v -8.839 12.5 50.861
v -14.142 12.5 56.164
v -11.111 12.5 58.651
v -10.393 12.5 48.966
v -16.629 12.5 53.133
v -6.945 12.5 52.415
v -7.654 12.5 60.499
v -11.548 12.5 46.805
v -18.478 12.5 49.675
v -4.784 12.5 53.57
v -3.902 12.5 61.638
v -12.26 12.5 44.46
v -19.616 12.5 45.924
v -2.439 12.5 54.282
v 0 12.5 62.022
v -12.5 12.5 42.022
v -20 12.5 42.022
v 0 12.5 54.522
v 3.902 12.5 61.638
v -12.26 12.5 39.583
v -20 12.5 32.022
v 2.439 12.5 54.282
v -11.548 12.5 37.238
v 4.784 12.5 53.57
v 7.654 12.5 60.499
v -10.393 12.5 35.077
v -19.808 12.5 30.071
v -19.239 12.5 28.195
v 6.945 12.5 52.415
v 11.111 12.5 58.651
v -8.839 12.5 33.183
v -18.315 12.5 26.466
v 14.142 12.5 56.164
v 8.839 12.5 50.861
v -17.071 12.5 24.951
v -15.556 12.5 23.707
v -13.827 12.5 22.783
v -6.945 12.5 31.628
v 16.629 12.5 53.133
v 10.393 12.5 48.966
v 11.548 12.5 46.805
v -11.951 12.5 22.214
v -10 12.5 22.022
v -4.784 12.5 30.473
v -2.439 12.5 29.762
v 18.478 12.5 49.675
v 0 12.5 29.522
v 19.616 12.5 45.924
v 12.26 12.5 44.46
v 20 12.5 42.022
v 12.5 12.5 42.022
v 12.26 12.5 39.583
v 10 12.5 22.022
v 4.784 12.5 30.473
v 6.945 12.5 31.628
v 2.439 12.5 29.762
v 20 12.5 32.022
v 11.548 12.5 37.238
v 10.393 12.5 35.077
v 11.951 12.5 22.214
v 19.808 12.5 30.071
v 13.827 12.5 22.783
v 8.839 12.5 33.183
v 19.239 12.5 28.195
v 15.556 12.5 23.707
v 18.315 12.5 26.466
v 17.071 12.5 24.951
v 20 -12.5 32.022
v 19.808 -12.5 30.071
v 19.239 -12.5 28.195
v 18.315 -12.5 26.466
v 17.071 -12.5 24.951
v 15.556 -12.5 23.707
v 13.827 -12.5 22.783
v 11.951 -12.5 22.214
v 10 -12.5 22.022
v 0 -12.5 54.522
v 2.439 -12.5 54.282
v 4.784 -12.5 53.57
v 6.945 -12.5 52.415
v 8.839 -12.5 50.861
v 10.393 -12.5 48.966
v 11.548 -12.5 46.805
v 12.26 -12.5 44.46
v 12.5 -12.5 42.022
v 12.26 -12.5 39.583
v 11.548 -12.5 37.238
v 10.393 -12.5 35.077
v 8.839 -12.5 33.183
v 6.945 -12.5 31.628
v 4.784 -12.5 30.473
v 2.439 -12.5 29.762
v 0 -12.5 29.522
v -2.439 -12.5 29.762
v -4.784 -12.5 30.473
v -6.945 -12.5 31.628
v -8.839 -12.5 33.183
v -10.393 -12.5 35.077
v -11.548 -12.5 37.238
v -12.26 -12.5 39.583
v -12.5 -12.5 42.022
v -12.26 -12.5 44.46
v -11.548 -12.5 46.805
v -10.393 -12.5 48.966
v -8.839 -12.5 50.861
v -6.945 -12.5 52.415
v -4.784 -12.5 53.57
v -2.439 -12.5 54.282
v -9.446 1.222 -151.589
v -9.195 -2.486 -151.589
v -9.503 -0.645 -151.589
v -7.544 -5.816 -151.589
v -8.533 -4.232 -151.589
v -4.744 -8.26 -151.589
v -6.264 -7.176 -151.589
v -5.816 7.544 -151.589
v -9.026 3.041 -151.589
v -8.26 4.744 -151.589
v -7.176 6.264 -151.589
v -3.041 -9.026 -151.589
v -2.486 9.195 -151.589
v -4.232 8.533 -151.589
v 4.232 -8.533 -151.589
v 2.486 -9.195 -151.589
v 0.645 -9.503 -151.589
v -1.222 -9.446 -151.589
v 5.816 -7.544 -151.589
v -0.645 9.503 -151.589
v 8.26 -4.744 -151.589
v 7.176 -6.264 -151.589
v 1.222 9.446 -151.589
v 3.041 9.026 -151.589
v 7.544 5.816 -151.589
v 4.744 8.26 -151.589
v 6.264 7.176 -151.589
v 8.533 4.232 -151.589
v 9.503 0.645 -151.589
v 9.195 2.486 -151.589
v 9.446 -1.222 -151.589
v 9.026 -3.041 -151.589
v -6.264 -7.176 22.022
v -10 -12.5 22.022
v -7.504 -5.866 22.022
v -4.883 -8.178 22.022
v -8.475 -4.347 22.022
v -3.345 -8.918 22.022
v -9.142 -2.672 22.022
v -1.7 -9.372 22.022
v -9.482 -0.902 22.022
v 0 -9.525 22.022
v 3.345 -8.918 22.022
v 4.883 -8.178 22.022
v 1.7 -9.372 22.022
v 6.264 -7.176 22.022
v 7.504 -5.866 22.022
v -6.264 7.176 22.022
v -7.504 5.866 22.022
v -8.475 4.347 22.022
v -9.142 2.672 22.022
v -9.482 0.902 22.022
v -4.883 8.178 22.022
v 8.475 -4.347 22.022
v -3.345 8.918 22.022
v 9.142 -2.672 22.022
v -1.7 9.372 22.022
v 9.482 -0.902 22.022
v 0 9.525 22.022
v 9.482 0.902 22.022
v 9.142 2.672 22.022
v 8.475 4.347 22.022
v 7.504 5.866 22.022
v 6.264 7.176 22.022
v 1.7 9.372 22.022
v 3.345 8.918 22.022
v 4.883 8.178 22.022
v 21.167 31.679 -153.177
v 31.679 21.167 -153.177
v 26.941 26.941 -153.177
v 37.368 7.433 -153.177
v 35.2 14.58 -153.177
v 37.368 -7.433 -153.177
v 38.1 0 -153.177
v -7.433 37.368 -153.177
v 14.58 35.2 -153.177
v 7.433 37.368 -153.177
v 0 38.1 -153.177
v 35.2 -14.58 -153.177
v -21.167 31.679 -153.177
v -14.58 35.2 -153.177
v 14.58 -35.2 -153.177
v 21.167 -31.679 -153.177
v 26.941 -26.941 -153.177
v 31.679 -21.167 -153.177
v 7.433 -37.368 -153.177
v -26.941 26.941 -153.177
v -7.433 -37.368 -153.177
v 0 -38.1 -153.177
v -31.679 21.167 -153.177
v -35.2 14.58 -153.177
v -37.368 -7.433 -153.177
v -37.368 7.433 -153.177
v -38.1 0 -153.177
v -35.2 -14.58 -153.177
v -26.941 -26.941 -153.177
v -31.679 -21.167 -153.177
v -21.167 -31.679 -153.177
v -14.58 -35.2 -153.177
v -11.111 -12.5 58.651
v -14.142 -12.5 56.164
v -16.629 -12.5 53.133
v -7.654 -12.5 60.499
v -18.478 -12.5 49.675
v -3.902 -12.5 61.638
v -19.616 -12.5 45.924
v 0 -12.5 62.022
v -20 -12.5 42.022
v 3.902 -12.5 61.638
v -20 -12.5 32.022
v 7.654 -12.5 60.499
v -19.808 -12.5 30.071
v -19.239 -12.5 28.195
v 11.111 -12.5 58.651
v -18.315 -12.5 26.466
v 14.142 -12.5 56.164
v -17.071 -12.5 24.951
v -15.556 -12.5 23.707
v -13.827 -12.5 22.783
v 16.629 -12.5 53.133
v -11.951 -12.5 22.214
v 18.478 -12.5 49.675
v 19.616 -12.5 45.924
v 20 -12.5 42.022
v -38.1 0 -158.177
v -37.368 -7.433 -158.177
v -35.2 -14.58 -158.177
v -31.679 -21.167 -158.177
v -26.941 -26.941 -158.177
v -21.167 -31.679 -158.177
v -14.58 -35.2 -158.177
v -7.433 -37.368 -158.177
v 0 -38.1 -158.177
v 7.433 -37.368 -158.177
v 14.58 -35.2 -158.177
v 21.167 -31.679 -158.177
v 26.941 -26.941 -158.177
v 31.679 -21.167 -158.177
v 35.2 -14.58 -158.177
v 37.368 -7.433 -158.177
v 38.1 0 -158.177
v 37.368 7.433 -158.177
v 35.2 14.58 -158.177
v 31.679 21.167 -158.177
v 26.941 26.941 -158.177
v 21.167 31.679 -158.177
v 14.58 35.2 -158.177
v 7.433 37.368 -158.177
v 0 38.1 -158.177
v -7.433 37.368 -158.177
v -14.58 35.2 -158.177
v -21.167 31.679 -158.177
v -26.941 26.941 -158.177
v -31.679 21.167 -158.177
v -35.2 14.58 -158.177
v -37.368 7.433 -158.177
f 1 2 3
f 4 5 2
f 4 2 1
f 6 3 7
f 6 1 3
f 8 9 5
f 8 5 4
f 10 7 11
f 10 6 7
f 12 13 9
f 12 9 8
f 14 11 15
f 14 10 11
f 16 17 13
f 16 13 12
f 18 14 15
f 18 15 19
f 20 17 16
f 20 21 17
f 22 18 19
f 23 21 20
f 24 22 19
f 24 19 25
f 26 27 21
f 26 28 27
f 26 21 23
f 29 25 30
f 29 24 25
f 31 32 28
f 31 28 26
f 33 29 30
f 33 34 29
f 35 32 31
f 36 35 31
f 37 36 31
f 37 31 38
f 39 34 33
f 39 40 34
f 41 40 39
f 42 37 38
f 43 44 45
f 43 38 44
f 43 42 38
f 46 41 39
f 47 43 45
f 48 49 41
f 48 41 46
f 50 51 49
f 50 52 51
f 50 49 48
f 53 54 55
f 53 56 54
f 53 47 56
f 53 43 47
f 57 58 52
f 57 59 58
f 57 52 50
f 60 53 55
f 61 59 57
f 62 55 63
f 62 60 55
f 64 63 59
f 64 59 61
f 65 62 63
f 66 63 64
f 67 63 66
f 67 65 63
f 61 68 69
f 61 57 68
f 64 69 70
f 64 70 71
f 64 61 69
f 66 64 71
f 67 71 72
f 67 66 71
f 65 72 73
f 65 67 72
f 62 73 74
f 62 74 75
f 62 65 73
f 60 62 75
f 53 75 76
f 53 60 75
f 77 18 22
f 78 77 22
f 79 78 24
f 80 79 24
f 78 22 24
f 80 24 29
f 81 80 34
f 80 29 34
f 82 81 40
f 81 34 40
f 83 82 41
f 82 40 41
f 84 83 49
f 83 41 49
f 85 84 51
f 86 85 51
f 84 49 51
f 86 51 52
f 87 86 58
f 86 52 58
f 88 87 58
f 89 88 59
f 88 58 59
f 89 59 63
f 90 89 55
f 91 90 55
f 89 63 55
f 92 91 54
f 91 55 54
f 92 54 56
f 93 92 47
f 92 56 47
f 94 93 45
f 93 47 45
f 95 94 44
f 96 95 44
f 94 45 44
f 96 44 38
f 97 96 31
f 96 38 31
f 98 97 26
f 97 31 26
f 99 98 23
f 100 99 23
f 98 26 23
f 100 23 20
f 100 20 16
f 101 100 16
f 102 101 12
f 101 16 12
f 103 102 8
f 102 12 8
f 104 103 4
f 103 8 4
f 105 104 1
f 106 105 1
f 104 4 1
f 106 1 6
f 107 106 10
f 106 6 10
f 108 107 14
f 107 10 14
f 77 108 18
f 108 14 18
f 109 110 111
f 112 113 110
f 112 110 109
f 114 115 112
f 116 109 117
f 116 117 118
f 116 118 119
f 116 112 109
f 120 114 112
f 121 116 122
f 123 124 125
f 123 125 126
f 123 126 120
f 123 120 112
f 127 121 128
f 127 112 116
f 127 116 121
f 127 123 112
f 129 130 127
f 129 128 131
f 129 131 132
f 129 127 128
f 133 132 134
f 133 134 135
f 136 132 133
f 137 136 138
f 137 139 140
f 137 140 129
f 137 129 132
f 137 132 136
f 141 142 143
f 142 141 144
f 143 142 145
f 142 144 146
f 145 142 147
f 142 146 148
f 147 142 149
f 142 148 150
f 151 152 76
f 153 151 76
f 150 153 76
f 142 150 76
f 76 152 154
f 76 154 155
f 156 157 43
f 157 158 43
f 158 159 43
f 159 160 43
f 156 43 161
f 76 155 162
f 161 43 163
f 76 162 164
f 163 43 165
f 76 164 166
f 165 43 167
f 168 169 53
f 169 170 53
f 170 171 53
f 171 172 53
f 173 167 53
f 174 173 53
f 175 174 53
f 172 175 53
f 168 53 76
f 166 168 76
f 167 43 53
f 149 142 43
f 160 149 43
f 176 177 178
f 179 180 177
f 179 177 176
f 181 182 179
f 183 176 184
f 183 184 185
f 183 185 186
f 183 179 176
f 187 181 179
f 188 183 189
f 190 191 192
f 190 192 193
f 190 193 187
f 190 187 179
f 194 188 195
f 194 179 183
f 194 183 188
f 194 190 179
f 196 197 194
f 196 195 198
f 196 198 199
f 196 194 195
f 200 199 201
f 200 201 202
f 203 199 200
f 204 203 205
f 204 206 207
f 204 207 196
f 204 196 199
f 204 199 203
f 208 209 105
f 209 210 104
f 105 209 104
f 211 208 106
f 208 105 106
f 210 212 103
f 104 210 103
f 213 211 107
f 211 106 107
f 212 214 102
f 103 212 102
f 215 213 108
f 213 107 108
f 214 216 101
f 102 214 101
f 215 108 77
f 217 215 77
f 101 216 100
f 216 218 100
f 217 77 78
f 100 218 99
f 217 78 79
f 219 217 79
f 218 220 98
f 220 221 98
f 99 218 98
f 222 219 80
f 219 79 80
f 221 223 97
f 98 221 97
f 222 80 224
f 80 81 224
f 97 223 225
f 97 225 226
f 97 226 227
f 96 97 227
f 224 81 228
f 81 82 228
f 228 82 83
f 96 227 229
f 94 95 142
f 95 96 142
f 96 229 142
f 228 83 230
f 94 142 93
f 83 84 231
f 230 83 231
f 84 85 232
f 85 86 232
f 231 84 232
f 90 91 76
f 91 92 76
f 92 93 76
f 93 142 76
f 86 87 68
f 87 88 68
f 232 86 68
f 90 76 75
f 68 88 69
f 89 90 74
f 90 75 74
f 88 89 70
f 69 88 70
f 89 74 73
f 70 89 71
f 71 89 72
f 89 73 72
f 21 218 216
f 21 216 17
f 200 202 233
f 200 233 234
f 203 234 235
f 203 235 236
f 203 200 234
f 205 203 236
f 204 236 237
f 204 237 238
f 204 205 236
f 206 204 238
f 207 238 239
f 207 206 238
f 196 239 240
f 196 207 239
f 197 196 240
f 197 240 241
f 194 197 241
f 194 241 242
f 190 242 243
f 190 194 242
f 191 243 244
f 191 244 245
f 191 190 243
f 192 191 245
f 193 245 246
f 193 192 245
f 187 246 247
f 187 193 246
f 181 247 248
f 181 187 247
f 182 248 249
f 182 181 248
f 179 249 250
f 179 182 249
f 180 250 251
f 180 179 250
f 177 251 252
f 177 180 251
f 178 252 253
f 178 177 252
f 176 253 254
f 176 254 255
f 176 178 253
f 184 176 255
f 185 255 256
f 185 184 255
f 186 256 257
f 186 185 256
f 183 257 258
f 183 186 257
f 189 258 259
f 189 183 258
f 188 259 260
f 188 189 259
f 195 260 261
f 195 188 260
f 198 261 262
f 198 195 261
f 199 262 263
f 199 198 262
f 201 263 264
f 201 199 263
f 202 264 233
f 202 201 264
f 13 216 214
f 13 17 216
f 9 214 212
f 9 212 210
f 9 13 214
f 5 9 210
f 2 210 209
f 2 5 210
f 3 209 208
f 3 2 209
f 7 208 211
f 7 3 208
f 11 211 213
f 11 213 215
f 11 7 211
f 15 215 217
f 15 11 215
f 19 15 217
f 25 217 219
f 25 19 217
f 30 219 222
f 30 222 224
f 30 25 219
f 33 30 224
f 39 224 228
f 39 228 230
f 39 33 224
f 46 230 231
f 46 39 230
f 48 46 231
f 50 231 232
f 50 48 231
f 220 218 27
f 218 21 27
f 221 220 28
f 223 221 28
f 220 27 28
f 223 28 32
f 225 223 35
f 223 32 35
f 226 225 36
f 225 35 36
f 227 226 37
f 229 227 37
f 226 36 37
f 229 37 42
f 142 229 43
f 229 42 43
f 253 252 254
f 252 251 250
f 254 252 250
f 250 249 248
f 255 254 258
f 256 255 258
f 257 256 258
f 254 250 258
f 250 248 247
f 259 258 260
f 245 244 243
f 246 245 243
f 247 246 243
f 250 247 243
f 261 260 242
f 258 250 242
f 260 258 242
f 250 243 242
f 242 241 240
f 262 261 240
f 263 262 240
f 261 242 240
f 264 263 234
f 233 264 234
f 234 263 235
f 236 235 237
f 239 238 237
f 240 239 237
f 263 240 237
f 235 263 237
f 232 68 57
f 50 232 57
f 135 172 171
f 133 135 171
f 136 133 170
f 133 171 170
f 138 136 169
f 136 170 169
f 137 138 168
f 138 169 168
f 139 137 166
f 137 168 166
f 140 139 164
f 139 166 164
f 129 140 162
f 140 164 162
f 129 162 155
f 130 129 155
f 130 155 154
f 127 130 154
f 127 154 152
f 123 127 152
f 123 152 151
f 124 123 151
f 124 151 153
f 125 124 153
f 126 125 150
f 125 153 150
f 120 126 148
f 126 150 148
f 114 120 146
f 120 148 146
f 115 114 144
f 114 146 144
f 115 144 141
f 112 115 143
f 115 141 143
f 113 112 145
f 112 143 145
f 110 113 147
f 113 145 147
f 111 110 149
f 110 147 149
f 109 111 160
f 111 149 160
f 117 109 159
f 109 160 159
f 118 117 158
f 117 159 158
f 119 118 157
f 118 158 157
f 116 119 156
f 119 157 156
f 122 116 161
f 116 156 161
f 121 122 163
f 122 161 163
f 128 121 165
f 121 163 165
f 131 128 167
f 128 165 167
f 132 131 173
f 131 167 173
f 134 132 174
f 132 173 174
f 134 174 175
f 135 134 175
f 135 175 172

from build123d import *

# Parameters (mm, degrees)
DODANIE_WYCI_GNI_CIE2_DEPTH = 12.7
SZKIC3_R                    = 9.525
DODANIE_WYCI_GNI_CIE3_DEPTH = 173.6109
SZKIC4_R                    = 38.1
DODANIE_WYCI_GNI_CIE4_DEPTH = 5
SZKIC5_W                    = 40
SZKIC5_H                    = 25
DODANIE_WYCI_GNI_CIE5_DEPTH = 40
ZAOKR_GLENIE1_RADIUS        = 20
ZAOKR_GLENIE1_LENGTH        = 25
ZAOKR_GLENIE2_R             = 10
SZKIC6_R                    = 12.5
WYTNIJ_WYCI_GNI_CIE1_DEPTH  = 25


with BuildPart() as part:
    # Szkic2 → Dodanie-wyciągnięcie2 (new body)
    with BuildSketch(Plane(origin=(0, 0, 34.7218), x_dir=(-1, 0, 0), z_dir=(0, 0, -1))):
        with BuildLine():
            Line((6.264010277, -7.1755), (-6.264010277, -7.1755))
            ThreePointArc((-6.264010277, -7.1755), (-9.525, 0), (-6.264010277, 7.1755))
            Line((-6.264010277, 7.1755), (6.264010277, 7.1755))
            ThreePointArc((6.264010277, 7.1755), (9.525, 0), (6.264010277, -7.1755))
        make_face()
    extrude(amount=DODANIE_WYCI_GNI_CIE2_DEPTH)

    # Szkic3 → Dodanie-wyciągnięcie3 (add)
    with BuildSketch(Plane(origin=(0, 0, 22.0218), x_dir=(-1, 0, 0), z_dir=(0, 0, -1))):
        with Locations(Location((0, 0, 0), (0, 0, 131.120047553))):
            Circle(SZKIC3_R)
    extrude(amount=DODANIE_WYCI_GNI_CIE3_DEPTH)

    # Szkic5 → Dodanie-wyciągnięcie5 (add)
    with BuildSketch(Plane.XY.offset(22.0218)):
        Rectangle(SZKIC5_W, SZKIC5_H)
    extrude(amount=DODANIE_WYCI_GNI_CIE5_DEPTH)

    # Zaokrąglenie1: full round fillet: the end face becomes a half cylinder, R = half its width
    zaokr_glenie1_face = Plane((0, 0, 62.0218), x_dir=(0, 1, 0), z_dir=(0, 0, 1))  # on the end face: x along it, z out of the body
    zaokr_glenie1_slab = zaokr_glenie1_face.offset(-ZAOKR_GLENIE1_RADIUS / 2) * Box(ZAOKR_GLENIE1_LENGTH, 2 * ZAOKR_GLENIE1_RADIUS, ZAOKR_GLENIE1_RADIUS, mode=Mode.PRIVATE)  # the body's end, R deep
    zaokr_glenie1_round = Plane((0, 0, 42.0218), x_dir=(0, 0, 1), z_dir=(0, 1, 0)) * Cylinder(ZAOKR_GLENIE1_RADIUS, ZAOKR_GLENIE1_LENGTH, mode=Mode.PRIVATE)  # its axis R under the face
    add(zaokr_glenie1_slab - zaokr_glenie1_round, mode=Mode.SUBTRACT)

    # Zaokrąglenie2
    zaokr_glenie2_edges = [part.edges().sort_by_distance(p)[0] for p in [
        (20, 0, 22.0218),
        (-20, 0, 22.0218),
    ]]
    fillet(zaokr_glenie2_edges, radius=ZAOKR_GLENIE2_R)

    # Szkic6 → Wytnij-wyciągnięcie1 (cut)
    with BuildSketch(Plane(origin=(0, 12.5, 0), x_dir=(1, 0, 0), z_dir=(0, 1, 0))):
        with Locations(Location((0, -42.0218, 0), (0, 0, 270))):
            Circle(SZKIC6_R)
    extrude(amount=-WYTNIJ_WYCI_GNI_CIE1_DEPTH, mode=Mode.SUBTRACT)


with BuildPart() as body_2:
    # Szkic4 → Dodanie-wyciągnięcie4 (new body)
    with BuildSketch(Plane.XY.offset(-153.1766)):
        with Locations(Location((0, 0, 0), (0, 0, 180))):
            Circle(SZKIC4_R)
    extrude(amount=-DODANIE_WYCI_GNI_CIE4_DEPTH)


solid = Compound([part.part, body_2.part])
